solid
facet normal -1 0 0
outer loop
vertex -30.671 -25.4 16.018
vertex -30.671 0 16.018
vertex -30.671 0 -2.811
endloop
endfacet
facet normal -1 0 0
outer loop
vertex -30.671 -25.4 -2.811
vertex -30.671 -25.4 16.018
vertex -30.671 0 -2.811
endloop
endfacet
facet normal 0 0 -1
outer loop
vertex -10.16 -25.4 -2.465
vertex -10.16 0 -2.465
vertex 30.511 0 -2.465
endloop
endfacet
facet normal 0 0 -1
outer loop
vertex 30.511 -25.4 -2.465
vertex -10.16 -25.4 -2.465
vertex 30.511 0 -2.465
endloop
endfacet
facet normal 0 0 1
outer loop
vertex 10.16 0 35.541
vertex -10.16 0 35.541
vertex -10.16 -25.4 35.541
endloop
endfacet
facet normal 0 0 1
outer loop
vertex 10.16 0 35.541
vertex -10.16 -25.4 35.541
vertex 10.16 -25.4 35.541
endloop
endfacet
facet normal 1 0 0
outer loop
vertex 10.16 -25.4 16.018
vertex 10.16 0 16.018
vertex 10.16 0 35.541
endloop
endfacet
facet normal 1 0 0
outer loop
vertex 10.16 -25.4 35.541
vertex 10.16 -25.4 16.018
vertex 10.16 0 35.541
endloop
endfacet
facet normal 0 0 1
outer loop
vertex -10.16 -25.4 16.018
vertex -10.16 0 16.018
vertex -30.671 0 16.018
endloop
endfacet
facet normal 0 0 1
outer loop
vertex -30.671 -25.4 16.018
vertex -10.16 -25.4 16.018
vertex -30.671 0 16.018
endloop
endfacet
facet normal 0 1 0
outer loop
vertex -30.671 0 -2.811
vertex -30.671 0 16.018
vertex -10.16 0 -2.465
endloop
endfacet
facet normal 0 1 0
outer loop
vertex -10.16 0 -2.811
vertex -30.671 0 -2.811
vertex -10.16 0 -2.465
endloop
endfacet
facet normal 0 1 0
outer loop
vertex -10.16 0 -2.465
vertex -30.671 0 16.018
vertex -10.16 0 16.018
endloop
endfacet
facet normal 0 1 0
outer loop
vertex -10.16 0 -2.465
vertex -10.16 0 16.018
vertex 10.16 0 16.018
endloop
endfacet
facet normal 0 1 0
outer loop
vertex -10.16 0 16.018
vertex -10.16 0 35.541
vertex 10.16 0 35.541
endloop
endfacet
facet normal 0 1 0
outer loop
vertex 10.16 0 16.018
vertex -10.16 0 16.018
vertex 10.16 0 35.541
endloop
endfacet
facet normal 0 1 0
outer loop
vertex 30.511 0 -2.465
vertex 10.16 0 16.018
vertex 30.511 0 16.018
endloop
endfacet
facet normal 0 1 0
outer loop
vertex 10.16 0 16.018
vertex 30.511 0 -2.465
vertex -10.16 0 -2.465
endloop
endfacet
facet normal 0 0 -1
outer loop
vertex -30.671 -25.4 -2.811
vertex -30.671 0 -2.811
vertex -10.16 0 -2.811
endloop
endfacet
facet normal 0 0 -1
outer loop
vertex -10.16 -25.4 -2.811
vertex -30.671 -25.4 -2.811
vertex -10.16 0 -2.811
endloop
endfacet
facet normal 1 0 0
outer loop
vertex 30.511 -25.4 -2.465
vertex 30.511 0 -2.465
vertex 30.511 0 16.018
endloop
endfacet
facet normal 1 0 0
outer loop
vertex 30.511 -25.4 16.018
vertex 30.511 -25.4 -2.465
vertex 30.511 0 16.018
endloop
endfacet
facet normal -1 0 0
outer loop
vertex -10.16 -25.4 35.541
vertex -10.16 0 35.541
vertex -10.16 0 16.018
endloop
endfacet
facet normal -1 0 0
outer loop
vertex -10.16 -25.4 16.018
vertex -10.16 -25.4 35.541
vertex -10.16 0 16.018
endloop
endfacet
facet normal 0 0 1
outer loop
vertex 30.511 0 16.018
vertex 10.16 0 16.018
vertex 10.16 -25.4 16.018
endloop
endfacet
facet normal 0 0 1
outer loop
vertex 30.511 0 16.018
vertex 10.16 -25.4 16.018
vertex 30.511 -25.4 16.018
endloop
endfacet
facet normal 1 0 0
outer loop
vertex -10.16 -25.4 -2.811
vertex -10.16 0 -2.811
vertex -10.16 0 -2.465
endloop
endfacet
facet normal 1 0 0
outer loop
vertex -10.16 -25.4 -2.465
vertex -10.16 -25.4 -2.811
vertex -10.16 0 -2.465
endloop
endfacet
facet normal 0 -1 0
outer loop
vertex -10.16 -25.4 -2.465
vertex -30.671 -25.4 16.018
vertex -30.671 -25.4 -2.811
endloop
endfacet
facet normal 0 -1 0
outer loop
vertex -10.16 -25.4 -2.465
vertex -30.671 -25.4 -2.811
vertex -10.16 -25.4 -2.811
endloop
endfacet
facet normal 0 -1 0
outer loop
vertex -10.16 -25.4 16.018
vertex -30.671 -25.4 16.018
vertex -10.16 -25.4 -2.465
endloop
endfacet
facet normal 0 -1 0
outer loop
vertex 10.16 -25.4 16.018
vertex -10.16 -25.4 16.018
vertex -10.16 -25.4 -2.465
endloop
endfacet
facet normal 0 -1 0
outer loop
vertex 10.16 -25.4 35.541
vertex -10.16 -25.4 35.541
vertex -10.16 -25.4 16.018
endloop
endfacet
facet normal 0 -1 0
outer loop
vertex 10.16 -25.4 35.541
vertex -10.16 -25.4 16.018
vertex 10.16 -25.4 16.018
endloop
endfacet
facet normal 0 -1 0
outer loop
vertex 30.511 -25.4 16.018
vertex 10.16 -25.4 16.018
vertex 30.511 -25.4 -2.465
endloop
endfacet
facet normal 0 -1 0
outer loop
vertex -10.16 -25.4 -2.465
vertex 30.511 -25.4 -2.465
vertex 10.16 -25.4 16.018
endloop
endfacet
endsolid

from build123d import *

# Parameters (mm, degrees)
F0_W     = 20.32
F0_H     = 18.4829973394
F0_H_2   = 19.5233401282
F0_W_2   = 20.3507310414
F1_DEPTH = 25.4


with BuildPart() as f1:
    # F0 (on Front) → F1 (new body)
    with BuildSketch(Plane.XZ):
        with Locations((0, 6.7764989921)):
            Rectangle(F0_W, F0_H)
        with Locations((0, 25.7796677259)):
            Rectangle(F0_W, F0_H_2)
        with Locations((20.3353655207, 6.7764989921)):
            Rectangle(F0_W_2, F0_H)
        Polygon((-10.16, -2.4649996776), (-10.16, 16.0179976618), (-30.6711569428, 16.0179976618), (-30.6711569428, -2.8106316458), (-10.16, -2.8106316458), align=None)
    extrude(amount=F1_DEPTH)


solid = f1.part
